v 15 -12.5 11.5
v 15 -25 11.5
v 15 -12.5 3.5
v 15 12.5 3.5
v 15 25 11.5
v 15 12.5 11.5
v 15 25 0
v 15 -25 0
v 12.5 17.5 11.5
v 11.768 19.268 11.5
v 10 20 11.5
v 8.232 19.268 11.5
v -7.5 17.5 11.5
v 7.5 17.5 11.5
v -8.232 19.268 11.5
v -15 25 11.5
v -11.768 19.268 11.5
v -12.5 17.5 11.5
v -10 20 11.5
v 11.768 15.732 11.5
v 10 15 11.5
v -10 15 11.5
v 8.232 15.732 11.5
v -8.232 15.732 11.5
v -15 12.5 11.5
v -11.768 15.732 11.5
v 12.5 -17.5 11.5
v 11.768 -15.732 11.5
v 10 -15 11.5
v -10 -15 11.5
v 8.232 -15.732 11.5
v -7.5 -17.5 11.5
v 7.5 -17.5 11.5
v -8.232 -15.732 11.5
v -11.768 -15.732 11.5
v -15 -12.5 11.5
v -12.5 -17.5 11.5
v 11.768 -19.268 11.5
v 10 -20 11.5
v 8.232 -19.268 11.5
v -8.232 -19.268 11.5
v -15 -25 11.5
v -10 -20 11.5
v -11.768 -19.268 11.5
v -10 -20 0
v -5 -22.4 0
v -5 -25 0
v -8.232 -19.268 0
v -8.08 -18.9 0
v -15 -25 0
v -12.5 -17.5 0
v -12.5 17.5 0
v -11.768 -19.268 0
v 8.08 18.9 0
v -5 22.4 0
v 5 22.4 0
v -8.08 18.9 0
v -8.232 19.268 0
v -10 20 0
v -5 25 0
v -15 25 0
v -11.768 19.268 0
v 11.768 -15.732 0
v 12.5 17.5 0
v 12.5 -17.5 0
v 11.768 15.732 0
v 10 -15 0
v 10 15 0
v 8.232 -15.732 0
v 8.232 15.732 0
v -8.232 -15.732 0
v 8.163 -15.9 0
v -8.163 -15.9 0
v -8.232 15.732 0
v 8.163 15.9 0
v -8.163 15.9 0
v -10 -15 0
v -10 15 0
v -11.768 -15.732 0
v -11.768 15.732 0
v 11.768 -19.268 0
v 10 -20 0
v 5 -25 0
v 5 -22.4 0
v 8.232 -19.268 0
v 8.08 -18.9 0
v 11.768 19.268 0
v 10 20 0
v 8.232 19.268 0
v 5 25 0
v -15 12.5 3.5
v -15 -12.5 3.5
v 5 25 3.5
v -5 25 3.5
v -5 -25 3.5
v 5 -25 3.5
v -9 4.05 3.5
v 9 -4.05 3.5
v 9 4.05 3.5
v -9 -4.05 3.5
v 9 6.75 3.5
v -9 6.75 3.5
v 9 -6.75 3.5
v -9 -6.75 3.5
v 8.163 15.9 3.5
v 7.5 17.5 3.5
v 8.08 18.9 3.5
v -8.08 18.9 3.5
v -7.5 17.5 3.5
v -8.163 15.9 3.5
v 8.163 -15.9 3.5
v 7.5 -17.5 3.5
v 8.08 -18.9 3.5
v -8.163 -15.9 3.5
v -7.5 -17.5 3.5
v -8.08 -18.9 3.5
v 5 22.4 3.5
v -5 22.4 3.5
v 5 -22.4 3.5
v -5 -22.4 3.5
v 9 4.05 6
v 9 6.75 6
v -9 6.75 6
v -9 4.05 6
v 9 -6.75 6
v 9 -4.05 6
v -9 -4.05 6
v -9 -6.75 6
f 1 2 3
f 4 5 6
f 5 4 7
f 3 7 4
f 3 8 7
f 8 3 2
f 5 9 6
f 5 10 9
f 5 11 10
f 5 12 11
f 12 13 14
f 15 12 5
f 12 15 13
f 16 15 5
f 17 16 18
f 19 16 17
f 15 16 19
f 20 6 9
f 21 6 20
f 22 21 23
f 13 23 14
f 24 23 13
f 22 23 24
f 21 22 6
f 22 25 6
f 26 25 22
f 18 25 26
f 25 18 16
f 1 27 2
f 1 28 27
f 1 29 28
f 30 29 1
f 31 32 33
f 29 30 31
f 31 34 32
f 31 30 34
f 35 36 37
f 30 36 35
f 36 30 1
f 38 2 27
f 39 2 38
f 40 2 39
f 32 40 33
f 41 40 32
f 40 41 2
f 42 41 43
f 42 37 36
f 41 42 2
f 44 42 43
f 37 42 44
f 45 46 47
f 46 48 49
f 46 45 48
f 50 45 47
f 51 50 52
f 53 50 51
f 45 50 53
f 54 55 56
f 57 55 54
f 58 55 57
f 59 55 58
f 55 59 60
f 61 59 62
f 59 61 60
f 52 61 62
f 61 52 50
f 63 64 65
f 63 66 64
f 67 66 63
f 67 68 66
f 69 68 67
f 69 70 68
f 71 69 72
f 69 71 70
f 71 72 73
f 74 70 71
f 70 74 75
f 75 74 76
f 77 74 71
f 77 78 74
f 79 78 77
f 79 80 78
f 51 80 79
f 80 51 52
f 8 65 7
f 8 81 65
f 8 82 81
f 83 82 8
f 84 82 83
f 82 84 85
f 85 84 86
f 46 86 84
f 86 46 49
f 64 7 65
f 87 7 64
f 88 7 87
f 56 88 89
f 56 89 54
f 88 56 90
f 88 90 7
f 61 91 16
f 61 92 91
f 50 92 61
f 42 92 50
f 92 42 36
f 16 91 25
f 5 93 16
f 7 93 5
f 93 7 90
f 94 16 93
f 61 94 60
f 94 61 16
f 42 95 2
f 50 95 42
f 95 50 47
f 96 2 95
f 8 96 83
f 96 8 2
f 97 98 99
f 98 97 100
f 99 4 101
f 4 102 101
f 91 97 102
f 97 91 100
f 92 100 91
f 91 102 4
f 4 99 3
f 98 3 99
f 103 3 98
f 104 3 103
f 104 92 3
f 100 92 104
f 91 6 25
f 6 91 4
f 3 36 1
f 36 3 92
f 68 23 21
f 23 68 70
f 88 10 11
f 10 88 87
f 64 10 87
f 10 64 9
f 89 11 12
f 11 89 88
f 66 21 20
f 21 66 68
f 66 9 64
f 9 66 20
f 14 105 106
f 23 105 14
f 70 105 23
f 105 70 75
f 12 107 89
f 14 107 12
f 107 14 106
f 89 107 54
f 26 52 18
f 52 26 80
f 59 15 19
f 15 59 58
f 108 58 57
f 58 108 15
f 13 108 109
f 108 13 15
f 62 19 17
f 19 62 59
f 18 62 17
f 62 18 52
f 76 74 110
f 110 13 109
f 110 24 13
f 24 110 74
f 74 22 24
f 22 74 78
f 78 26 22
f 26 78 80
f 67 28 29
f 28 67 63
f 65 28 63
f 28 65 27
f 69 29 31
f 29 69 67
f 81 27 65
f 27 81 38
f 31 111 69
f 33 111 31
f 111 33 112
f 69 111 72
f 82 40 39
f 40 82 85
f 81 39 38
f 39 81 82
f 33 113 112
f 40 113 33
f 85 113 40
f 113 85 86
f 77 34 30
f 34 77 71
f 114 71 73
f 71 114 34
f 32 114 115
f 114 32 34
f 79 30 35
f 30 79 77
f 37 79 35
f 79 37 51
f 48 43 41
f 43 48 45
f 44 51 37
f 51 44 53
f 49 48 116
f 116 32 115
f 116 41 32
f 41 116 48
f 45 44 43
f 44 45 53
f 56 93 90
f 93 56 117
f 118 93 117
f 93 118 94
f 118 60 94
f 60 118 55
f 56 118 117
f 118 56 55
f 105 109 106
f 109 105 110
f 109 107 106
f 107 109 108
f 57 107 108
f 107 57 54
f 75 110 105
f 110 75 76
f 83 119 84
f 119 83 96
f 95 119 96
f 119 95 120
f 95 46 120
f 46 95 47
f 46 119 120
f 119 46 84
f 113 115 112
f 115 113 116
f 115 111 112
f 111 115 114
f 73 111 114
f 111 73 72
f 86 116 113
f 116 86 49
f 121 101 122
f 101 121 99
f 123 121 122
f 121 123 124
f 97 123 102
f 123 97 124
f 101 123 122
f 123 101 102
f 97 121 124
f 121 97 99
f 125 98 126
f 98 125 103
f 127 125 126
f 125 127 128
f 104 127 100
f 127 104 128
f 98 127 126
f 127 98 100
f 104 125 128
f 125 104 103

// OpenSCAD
difference()
{
    translate([0,0,11.5]/2) cube ([30,50,11.5],center=true);
    translate([0,0,50]/2 + [0,0,11.5 - 8]) cube([40,25,50],center=true);


translate([20,35,0]/2) cylinder(d=5, h=50,  center=true);
translate([-20,35,0]/2) cylinder(d=5, h=50,  center=true);
    translate([20,-35,0]/2) cylinder(d=5, h=50,  center=true);
    translate([-20,-35,0]/2) cylinder(d=5, h=50,  center=true);
   translate([0,(6.8+41)/2,11.5-10]) cube([10,3,4],center=true);
    translate([0,(6.8+28)/2,11.5-10]) cube([18,3,4],center=true);
       translate([0,-(6.8+41)/2,11.5-10]) cube([10,3,4],center=true);
    translate([0,-(6.8+28)/2,11.5-10]) cube([18,3,4],center=true);
}
translate([0,(6.8+4)/2,11.5-8]) cube([18,2.7,5],center=true);
translate([0,-(6.8+4)/2,11.5-8]) cube([18,2.7,5],center=true);
